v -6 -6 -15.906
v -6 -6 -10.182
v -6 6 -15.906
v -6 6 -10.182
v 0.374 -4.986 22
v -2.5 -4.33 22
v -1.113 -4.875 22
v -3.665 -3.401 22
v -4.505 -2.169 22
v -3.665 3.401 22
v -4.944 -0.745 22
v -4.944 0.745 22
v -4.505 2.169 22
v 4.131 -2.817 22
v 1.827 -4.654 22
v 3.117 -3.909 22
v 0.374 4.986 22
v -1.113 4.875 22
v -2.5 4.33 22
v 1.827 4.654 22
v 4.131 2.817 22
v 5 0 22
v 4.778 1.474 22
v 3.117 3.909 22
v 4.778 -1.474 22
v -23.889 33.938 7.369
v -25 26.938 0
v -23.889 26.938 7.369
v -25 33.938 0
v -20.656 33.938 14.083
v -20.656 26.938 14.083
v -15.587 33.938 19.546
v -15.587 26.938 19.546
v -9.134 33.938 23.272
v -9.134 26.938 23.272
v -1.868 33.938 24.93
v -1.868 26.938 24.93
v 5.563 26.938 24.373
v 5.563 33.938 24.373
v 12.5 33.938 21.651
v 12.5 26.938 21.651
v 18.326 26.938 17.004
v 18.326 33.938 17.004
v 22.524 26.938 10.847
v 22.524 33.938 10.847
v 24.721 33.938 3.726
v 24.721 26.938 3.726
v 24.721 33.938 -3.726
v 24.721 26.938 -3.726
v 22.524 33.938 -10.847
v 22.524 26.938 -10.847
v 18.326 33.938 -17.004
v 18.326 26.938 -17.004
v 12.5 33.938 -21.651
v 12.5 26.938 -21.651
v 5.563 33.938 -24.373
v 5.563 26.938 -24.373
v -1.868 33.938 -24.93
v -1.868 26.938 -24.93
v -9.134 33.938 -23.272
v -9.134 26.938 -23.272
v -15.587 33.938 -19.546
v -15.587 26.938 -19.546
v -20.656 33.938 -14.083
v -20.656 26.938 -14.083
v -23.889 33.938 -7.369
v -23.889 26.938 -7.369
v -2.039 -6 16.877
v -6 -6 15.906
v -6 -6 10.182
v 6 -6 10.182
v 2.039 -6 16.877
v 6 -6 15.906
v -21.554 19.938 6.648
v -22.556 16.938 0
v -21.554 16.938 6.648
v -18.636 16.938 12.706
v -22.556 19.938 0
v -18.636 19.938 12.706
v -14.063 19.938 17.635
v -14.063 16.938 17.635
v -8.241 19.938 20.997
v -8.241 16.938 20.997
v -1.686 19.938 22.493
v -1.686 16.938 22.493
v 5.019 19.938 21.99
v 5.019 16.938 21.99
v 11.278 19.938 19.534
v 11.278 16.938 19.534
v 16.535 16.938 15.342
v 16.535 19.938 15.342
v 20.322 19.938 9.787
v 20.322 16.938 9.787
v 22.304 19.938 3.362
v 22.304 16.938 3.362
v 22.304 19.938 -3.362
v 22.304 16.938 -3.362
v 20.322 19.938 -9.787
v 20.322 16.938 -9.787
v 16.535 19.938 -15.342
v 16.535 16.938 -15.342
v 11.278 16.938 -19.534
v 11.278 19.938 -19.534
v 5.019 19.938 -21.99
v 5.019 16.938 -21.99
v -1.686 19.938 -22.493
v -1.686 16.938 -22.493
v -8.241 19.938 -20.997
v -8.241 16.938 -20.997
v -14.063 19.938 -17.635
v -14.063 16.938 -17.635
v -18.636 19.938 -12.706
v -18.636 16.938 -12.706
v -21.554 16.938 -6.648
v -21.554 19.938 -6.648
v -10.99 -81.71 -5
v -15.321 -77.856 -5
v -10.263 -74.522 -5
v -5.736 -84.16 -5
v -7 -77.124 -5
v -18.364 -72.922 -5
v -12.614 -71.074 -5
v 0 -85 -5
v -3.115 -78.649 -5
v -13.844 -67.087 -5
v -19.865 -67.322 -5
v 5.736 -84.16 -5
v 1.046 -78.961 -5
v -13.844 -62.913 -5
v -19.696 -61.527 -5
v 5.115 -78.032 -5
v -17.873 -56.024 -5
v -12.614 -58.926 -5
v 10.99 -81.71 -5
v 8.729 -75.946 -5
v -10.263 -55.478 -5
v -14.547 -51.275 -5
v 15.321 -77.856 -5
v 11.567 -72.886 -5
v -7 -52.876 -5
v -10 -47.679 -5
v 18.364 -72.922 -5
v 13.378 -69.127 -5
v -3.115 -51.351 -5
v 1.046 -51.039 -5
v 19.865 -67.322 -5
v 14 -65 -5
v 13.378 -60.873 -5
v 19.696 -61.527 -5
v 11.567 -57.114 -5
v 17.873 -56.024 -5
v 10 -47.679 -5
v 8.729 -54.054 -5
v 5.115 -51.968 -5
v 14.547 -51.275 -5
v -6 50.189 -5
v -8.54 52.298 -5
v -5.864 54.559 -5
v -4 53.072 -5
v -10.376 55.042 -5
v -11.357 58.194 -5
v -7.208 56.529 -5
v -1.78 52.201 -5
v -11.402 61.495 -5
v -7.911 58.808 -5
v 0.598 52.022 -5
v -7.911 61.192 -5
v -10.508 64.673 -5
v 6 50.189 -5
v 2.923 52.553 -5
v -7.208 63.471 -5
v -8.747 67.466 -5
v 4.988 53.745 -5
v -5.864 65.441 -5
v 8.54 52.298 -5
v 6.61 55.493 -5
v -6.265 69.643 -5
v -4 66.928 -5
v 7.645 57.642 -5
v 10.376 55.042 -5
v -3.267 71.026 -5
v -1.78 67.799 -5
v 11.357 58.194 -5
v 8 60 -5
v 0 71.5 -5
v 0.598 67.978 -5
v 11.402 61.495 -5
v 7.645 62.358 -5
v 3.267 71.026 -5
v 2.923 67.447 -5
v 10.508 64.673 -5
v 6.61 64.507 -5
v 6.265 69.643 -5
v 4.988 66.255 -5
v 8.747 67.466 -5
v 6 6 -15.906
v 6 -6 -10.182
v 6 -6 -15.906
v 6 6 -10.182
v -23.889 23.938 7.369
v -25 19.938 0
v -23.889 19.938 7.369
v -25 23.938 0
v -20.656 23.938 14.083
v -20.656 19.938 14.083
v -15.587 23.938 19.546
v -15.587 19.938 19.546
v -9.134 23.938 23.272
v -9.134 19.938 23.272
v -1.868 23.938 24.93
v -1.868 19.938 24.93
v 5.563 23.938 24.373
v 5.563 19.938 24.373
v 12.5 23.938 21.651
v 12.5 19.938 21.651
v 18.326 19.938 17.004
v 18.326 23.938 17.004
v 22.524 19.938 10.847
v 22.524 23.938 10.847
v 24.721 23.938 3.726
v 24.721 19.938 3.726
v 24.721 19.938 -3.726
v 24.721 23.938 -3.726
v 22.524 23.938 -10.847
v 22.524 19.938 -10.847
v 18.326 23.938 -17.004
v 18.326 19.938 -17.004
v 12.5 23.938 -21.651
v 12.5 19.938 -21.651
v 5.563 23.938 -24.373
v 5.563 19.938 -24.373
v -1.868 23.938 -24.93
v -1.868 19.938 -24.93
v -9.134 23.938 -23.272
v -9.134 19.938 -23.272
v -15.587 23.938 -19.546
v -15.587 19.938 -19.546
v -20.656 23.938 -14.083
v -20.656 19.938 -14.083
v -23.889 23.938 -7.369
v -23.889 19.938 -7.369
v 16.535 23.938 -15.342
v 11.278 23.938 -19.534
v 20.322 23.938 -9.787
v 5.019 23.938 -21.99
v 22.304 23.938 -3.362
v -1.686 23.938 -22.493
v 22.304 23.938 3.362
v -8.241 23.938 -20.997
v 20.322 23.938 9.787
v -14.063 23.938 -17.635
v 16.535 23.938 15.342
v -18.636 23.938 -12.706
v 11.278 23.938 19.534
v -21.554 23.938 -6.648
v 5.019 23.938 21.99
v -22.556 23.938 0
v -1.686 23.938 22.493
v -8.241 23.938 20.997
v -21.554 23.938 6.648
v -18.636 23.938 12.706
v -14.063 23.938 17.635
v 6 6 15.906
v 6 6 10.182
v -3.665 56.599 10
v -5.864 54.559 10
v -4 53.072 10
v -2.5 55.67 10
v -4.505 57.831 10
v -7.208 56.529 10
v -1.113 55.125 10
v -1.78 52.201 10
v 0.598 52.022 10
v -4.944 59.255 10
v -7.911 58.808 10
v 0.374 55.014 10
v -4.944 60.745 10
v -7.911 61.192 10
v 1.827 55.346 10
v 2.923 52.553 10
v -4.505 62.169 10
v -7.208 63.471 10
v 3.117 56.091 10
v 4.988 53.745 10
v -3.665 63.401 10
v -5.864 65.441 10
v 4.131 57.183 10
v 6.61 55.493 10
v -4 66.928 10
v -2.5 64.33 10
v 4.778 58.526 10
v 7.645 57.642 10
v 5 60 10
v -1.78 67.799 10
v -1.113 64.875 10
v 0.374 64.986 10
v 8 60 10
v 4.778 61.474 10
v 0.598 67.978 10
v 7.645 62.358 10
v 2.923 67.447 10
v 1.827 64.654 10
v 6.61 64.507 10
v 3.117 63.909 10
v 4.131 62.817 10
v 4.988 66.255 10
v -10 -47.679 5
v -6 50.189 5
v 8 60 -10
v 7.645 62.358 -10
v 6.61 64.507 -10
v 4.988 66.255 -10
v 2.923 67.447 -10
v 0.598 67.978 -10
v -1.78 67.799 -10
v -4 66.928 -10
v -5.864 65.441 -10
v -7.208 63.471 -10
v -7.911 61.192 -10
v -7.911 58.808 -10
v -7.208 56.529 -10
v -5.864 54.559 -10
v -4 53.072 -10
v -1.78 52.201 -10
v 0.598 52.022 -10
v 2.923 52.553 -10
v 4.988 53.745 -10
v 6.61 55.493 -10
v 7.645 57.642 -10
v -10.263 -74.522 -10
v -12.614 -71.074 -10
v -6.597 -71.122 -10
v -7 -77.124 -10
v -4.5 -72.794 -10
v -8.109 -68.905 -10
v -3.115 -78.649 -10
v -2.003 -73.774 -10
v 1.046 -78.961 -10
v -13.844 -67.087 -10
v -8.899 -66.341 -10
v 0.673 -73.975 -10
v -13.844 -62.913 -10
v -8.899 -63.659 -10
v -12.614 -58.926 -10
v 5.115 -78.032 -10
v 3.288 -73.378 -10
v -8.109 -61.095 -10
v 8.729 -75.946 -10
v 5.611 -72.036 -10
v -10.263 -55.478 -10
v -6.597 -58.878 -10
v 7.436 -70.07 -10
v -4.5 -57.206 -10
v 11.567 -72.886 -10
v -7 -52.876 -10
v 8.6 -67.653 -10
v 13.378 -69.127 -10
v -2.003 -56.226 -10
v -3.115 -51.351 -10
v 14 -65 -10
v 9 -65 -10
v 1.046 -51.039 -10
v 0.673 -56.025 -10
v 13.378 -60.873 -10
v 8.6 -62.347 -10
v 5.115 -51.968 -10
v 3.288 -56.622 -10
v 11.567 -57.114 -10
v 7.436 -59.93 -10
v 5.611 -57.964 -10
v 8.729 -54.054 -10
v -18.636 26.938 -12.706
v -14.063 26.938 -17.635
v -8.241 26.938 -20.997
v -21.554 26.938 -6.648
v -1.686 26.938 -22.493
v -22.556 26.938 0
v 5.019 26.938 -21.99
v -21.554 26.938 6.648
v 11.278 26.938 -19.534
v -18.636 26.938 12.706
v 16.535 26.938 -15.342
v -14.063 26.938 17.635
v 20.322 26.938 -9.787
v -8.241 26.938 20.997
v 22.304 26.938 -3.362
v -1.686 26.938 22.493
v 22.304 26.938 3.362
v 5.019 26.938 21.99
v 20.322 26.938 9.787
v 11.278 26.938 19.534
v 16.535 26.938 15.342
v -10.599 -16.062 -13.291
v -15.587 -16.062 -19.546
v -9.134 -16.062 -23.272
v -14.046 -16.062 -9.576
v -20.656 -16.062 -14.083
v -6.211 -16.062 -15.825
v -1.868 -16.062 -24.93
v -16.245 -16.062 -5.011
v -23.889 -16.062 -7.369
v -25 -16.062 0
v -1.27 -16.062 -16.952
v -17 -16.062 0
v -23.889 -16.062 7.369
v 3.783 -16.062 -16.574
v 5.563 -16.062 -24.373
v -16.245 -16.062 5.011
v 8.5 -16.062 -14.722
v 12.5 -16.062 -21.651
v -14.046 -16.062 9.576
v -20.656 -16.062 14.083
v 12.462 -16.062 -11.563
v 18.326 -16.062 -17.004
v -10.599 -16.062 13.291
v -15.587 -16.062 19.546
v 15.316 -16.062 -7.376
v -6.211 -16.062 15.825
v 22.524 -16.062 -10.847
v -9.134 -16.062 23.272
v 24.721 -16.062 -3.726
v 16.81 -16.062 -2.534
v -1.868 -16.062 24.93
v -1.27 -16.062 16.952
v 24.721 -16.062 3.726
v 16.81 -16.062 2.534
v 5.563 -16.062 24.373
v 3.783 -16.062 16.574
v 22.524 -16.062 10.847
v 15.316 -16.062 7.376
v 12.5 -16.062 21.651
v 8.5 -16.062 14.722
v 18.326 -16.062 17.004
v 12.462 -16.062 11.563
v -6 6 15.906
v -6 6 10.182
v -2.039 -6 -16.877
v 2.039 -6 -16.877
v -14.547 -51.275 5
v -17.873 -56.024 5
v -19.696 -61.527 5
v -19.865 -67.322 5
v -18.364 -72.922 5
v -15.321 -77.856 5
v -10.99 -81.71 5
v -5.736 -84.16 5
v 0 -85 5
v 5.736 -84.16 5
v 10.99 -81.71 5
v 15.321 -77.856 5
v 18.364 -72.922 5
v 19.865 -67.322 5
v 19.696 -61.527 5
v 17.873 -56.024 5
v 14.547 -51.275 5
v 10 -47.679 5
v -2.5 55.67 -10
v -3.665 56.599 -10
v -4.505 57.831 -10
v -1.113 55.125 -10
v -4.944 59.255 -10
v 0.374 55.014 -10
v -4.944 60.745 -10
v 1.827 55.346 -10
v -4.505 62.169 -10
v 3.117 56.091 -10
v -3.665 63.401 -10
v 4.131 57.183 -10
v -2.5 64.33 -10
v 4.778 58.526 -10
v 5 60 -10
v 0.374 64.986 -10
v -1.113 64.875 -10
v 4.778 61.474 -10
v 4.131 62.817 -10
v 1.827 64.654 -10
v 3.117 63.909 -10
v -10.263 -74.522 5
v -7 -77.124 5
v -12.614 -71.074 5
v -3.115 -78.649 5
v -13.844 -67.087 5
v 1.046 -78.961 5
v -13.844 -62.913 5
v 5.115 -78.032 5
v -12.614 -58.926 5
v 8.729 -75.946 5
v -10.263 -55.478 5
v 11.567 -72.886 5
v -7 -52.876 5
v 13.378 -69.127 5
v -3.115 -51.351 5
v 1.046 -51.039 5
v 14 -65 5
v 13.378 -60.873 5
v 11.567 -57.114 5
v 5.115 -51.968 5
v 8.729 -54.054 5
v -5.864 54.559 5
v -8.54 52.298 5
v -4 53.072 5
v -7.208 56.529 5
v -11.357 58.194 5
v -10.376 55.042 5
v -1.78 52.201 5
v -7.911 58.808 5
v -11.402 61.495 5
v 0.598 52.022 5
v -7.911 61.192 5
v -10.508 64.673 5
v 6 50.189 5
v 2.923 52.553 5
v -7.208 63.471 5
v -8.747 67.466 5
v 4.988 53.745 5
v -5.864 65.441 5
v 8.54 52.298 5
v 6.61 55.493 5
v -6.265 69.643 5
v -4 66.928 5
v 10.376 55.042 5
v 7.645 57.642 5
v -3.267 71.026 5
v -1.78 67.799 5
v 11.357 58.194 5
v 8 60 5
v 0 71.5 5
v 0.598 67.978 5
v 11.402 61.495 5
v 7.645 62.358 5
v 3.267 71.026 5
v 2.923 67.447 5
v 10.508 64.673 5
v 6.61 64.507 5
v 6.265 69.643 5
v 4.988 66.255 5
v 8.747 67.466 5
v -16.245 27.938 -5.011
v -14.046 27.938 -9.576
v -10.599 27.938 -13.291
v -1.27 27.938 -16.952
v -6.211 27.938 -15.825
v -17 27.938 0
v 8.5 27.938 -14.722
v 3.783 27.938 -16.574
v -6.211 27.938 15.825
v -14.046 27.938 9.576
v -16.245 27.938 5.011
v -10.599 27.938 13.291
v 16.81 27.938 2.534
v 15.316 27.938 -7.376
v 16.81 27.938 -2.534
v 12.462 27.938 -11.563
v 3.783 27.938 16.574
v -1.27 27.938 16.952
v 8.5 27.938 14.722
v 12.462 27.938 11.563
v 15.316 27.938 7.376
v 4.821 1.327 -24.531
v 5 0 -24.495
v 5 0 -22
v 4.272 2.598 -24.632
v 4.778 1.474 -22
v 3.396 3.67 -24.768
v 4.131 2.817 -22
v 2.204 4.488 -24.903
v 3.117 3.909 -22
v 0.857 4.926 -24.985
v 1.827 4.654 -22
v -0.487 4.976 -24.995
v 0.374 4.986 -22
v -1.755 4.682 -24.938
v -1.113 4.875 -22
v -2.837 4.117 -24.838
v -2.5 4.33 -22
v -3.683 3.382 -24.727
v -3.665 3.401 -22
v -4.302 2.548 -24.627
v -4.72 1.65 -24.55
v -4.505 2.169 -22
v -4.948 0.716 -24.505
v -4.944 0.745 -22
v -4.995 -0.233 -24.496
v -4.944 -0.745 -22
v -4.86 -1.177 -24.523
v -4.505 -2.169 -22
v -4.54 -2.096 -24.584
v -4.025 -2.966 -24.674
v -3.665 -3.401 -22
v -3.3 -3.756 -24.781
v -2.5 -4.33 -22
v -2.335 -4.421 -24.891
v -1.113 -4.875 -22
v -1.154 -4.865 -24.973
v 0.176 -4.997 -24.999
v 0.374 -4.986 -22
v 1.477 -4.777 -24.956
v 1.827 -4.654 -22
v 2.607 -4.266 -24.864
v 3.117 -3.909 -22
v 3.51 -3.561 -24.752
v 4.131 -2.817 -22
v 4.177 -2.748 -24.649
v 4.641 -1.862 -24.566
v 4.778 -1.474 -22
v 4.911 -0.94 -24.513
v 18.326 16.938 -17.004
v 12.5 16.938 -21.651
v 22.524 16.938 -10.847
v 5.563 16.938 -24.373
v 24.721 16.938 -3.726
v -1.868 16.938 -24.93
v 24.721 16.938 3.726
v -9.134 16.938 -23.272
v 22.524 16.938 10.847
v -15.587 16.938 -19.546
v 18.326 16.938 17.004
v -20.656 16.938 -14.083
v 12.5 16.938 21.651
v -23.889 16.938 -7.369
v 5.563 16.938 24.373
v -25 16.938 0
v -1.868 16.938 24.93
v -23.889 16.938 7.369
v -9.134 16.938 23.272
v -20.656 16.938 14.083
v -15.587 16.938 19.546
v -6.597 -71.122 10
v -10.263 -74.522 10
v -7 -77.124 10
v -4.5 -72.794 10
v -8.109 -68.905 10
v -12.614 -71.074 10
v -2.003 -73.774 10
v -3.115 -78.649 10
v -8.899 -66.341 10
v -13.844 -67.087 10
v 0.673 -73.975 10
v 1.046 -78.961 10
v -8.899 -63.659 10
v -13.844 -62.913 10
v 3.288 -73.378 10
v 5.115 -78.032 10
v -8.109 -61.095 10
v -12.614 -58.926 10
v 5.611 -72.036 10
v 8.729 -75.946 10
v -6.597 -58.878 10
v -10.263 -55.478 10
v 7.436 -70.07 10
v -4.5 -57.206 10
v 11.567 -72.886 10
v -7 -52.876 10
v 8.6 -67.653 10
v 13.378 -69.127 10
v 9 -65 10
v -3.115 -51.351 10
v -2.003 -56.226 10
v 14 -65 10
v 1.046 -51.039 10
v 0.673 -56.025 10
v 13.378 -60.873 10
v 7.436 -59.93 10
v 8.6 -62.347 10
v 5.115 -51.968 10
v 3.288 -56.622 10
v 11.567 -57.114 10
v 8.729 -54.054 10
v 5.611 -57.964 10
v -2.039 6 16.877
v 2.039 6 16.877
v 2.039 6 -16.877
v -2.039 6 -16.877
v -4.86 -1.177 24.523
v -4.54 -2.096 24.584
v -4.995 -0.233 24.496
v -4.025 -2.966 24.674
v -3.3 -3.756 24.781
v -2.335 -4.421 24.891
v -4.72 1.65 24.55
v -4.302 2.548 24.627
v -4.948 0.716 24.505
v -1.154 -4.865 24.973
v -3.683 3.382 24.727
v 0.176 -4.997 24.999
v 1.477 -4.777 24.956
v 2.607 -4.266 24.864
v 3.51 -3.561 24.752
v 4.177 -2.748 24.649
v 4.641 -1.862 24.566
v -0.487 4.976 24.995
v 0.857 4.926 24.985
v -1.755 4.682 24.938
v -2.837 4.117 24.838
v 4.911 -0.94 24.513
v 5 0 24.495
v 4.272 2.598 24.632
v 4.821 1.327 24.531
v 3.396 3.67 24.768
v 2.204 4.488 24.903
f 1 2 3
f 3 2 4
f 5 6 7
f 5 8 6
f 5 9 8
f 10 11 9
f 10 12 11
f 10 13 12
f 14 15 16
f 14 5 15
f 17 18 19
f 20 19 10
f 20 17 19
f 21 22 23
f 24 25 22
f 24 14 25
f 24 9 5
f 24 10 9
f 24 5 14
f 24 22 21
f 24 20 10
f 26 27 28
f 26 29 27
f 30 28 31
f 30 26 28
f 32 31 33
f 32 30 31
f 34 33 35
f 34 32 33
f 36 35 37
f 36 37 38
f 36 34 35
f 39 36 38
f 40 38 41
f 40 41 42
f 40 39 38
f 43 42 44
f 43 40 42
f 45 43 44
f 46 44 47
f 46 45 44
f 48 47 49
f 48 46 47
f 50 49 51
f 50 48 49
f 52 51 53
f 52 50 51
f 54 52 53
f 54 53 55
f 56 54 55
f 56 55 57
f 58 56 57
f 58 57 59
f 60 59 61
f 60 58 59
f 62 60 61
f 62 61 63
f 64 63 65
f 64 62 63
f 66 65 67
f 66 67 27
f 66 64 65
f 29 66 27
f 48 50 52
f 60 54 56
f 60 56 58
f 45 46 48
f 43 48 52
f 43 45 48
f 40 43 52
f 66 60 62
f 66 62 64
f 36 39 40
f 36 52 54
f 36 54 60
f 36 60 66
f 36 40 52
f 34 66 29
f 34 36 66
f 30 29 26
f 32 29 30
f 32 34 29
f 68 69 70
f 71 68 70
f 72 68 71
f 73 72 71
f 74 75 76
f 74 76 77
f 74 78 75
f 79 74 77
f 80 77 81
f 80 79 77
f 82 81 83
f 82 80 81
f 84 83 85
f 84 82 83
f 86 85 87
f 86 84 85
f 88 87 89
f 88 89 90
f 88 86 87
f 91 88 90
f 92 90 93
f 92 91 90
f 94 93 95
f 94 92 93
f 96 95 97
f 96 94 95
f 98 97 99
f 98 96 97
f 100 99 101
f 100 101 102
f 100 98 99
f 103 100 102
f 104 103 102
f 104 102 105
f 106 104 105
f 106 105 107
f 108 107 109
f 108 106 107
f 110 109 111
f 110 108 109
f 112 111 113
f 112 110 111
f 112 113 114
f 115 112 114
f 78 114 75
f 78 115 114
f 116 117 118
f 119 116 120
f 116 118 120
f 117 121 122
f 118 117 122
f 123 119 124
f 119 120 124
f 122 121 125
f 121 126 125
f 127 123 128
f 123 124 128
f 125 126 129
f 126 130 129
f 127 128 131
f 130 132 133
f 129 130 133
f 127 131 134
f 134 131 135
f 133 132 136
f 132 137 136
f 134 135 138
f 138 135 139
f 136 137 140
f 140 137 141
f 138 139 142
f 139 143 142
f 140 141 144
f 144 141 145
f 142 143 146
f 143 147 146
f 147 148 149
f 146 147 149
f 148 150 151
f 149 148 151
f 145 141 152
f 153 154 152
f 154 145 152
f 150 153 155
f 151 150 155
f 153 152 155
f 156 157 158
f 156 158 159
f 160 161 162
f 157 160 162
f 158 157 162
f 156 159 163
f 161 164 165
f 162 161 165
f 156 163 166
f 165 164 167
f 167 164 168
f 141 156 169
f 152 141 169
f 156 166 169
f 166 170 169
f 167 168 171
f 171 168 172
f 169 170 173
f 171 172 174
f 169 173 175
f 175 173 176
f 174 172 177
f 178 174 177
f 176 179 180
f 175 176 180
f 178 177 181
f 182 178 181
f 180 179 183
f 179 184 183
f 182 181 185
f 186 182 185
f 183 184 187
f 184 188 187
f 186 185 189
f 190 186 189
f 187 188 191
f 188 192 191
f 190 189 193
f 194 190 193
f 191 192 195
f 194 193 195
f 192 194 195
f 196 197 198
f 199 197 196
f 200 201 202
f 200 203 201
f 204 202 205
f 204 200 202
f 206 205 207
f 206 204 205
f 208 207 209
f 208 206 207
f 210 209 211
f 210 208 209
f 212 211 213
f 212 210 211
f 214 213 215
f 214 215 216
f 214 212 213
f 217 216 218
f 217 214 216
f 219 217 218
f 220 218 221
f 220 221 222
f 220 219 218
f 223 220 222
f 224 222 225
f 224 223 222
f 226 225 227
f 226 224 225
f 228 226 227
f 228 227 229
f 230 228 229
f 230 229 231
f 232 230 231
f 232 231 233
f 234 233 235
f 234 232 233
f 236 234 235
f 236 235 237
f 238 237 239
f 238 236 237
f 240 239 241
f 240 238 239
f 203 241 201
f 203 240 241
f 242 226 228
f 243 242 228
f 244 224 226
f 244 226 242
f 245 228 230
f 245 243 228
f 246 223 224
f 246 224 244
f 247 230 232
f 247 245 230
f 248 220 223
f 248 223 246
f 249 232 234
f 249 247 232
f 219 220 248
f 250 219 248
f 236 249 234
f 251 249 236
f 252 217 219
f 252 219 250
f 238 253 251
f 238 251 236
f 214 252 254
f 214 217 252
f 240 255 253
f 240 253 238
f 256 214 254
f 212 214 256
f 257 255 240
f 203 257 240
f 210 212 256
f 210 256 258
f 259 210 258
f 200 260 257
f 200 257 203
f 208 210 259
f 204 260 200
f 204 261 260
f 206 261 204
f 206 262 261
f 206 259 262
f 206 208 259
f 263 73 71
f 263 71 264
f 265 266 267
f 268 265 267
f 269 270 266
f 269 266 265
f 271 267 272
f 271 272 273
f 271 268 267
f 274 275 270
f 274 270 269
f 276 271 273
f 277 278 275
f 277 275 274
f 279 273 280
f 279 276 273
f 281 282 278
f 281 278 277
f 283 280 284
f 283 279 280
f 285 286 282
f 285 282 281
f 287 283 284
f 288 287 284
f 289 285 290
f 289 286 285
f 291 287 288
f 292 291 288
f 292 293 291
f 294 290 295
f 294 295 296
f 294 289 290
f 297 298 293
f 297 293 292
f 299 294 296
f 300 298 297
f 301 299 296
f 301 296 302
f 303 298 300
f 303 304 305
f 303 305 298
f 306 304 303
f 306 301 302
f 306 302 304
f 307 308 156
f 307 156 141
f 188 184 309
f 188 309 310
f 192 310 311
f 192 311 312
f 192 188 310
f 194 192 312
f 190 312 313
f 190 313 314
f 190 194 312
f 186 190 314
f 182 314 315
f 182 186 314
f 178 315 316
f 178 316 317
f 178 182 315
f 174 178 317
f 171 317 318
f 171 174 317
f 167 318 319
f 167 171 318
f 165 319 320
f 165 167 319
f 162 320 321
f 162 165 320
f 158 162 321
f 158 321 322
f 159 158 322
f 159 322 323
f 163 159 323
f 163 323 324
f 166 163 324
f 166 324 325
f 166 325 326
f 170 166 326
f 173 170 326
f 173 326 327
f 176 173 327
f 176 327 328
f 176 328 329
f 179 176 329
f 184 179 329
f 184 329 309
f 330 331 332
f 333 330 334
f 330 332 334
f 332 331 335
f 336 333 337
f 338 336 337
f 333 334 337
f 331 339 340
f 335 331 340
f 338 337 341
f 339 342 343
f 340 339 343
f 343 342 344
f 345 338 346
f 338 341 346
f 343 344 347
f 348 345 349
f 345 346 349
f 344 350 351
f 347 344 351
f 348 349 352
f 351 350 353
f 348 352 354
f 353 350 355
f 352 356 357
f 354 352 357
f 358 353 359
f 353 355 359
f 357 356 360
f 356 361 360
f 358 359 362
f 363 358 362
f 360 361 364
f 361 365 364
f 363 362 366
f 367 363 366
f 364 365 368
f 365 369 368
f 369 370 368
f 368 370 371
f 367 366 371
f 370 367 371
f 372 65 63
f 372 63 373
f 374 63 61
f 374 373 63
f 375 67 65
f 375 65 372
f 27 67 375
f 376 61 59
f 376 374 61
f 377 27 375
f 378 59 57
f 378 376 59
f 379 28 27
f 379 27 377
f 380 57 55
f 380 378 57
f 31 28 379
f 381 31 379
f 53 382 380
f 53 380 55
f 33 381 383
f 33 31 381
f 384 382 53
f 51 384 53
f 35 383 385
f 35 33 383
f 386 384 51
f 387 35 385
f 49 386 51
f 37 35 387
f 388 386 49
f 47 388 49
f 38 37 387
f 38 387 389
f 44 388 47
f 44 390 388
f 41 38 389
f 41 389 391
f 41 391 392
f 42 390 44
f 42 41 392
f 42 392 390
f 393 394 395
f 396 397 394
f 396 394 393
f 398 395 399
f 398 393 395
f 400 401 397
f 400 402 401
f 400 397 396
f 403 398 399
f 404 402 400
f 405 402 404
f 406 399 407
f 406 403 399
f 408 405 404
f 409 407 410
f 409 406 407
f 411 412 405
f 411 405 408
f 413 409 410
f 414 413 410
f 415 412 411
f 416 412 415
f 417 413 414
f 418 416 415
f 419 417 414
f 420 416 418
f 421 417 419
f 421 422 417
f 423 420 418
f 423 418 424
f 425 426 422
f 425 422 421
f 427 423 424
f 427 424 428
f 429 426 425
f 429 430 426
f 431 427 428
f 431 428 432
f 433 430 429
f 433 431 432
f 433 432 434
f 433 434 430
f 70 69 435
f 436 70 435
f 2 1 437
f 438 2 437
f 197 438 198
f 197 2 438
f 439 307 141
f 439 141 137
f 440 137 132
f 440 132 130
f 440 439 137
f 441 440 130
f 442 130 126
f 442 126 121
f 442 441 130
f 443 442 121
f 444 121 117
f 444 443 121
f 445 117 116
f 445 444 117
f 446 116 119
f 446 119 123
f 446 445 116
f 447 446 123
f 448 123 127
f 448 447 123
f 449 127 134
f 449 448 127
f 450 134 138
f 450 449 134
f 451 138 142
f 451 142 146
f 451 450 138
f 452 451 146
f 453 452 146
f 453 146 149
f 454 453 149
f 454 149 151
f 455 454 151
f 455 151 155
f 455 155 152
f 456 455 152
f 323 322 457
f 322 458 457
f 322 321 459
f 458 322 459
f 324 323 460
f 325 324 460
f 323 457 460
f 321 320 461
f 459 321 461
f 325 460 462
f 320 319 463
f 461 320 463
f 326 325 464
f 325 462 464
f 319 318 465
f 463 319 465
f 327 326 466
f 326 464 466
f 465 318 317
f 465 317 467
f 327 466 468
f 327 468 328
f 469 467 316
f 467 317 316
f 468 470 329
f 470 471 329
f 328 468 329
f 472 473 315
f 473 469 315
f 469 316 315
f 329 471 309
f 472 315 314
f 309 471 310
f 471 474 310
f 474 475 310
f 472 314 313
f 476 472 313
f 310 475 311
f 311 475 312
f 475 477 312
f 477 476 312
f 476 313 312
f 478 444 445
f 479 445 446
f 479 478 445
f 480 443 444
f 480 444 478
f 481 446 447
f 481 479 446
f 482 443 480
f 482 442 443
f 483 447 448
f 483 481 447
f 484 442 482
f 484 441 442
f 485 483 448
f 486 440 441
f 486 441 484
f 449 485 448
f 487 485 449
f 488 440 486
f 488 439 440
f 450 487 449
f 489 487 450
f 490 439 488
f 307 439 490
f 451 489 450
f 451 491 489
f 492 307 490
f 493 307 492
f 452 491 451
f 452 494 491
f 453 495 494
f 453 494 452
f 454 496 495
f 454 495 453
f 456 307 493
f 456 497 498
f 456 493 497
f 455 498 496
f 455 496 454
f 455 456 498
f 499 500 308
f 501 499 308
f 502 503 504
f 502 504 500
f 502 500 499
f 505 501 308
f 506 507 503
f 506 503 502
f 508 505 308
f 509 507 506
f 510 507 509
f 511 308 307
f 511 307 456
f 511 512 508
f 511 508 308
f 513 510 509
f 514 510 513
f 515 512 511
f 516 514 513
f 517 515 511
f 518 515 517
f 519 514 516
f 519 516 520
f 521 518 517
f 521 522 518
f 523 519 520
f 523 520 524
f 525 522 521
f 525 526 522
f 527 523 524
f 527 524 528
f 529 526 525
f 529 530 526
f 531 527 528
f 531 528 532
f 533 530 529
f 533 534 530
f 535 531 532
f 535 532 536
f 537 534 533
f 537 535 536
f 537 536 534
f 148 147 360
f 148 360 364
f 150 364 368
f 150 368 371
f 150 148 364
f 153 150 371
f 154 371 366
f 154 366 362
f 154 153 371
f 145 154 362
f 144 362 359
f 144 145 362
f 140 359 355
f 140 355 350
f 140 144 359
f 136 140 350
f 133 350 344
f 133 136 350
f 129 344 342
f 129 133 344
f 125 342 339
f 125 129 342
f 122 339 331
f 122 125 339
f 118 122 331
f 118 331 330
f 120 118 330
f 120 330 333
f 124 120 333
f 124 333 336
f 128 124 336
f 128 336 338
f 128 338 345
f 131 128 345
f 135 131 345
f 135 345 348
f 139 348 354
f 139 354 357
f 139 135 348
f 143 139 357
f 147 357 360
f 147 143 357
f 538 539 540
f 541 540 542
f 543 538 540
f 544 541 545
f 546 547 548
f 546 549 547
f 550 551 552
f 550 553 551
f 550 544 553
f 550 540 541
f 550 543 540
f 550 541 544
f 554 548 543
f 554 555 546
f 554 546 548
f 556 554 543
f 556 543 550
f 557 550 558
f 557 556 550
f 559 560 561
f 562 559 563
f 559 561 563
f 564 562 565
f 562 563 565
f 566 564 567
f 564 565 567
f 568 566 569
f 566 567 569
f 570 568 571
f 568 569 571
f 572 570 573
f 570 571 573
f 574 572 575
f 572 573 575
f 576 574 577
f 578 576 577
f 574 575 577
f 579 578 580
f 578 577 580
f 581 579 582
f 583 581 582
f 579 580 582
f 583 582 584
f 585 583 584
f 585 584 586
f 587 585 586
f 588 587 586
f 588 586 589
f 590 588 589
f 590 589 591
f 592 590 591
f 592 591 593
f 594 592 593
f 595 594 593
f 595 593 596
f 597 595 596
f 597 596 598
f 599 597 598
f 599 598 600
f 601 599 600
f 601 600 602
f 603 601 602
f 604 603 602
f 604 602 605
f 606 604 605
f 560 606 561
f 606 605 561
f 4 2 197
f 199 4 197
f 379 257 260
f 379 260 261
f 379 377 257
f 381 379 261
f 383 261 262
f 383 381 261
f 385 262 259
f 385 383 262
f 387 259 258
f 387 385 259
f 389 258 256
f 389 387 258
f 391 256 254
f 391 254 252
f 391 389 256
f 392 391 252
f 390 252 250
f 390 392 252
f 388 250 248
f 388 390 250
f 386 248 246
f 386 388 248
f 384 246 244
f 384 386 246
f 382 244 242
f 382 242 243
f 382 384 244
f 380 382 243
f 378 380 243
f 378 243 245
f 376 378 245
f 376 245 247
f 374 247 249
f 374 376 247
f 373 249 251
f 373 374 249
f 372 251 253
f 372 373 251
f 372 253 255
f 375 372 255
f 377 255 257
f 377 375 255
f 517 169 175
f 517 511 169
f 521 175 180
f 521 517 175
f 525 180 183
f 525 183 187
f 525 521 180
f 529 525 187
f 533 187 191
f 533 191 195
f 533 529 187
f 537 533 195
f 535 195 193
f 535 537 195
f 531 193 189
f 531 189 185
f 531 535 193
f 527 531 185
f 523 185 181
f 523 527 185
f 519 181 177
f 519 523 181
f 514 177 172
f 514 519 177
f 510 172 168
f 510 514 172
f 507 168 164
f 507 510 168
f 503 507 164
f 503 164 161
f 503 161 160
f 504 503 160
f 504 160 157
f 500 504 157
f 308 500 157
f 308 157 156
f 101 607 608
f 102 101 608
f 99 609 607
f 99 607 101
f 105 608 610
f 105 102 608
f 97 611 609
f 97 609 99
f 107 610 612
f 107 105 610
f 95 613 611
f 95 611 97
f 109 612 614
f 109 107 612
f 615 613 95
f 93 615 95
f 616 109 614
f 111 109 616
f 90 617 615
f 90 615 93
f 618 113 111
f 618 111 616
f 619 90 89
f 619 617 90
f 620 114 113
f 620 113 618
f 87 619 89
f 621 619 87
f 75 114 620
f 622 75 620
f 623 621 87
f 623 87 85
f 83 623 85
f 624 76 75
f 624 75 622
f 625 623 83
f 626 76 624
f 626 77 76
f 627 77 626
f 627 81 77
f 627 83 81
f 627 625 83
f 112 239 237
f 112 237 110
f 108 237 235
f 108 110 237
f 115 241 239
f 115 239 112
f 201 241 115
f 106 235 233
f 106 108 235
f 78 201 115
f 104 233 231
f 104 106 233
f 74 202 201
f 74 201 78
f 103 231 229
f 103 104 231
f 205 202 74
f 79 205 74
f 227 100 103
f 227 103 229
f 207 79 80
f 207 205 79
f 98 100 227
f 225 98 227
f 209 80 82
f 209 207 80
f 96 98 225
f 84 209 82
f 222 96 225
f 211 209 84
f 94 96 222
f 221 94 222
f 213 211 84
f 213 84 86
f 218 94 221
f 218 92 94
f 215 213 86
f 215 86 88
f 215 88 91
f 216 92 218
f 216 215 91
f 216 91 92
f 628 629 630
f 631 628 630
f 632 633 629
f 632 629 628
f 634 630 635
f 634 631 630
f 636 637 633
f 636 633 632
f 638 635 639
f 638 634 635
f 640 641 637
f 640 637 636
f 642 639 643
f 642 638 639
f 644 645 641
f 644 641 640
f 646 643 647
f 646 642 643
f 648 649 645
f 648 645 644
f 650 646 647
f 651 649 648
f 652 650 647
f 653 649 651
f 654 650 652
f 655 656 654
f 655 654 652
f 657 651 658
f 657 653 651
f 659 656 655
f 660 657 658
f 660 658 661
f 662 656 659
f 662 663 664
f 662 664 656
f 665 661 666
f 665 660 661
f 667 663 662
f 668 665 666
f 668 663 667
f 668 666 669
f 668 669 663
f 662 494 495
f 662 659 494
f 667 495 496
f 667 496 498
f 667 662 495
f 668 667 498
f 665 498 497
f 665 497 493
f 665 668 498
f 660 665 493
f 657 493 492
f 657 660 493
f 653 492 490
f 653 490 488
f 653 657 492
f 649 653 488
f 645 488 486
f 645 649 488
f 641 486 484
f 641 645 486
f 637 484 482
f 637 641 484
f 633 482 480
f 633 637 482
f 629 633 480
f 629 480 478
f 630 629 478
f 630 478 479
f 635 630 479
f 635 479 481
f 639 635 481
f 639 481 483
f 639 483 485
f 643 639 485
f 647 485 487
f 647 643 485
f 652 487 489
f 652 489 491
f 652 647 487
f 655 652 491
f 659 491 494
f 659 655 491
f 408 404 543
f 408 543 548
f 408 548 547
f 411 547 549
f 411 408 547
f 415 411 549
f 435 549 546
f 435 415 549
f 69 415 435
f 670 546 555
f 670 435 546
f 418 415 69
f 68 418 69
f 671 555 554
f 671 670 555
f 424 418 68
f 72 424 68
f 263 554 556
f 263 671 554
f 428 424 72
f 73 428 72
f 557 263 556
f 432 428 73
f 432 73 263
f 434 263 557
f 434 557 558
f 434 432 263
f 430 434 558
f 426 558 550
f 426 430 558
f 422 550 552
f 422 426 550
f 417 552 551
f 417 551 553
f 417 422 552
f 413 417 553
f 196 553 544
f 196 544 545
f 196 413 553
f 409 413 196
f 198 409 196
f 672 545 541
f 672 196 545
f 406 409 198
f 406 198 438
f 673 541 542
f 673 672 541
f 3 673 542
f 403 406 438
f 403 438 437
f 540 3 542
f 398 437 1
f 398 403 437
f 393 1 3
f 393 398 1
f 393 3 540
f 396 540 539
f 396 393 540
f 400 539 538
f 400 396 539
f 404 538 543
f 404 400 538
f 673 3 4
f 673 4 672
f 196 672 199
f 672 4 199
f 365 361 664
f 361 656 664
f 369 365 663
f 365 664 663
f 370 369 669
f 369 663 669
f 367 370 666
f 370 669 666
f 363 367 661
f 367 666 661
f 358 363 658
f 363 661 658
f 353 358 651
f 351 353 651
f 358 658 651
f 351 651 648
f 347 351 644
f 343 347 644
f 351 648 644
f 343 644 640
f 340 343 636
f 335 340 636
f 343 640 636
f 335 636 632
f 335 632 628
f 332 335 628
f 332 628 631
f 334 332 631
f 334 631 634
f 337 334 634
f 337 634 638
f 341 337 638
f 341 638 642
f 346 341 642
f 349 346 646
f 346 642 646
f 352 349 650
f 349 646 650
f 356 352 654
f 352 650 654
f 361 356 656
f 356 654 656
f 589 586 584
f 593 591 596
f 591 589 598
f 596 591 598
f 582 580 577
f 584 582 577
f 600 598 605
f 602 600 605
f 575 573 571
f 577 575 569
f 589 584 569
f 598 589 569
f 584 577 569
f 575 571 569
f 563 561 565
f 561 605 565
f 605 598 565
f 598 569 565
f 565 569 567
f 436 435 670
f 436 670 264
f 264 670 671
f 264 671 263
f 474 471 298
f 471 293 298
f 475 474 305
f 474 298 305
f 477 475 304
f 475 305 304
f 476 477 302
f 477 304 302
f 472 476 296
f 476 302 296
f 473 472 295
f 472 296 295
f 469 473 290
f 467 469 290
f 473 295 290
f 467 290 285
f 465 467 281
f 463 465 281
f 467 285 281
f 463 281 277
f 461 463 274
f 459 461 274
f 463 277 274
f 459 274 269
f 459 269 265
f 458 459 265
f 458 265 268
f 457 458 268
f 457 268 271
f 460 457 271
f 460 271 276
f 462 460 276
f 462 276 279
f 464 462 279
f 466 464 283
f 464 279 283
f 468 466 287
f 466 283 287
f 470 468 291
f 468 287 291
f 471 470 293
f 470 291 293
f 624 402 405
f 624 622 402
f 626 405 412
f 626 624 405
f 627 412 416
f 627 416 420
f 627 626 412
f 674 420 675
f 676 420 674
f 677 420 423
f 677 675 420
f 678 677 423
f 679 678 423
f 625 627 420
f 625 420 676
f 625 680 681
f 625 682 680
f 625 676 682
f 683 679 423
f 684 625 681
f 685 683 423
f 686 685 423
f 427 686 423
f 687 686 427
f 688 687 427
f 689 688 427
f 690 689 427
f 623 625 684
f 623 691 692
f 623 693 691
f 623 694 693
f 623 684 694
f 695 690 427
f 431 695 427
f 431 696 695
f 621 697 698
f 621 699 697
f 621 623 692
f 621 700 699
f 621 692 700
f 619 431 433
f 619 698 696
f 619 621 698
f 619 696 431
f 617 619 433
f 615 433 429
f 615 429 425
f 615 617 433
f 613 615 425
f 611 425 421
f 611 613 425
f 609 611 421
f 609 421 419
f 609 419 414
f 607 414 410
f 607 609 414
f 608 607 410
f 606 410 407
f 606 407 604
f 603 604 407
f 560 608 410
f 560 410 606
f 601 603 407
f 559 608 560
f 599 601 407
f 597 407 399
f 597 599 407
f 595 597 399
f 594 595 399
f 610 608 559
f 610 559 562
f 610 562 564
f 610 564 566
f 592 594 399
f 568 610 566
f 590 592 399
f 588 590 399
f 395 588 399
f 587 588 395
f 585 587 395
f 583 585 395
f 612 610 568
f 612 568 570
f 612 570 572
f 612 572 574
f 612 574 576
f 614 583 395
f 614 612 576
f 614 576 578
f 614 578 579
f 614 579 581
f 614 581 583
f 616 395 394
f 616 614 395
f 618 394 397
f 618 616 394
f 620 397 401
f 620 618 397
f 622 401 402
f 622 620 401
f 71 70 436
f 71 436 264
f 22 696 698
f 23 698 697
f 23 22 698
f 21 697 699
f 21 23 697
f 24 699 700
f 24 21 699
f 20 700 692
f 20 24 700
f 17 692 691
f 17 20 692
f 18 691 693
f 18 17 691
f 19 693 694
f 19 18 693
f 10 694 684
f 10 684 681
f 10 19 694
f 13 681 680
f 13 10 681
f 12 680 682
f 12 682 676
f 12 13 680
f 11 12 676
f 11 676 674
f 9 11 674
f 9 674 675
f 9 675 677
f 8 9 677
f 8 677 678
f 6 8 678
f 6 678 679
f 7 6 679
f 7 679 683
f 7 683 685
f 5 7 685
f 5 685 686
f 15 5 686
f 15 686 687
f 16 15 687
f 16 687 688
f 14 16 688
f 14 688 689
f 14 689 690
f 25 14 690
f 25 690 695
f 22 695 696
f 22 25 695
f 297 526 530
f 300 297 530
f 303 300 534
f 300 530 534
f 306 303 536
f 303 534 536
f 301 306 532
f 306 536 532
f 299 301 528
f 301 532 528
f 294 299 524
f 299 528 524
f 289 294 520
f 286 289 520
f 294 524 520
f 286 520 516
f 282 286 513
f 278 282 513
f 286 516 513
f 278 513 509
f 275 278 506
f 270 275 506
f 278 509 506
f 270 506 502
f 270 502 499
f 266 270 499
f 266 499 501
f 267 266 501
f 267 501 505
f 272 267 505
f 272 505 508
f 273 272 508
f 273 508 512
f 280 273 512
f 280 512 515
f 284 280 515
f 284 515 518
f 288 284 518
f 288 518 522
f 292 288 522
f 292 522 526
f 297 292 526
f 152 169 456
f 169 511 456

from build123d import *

# Parameters (mm, degrees)
SKETCH001_R          = 5
POCKET_DEPTH         = 25.001
POCKET_DEPTH_BACK    = 25.001
SKETCH005_W          = 12
SKETCH005_H          = 12
PAD002_DEPTH         = 44
SKETCH006_W          = 20.492604
SKETCH006_H          = 20.363478
POCKET002_DEPTH      = 16
PAD_DEPTH            = 5
SKETCH003_R          = 8
SKETCH003_R_2        = 14
PAD001_DEPTH         = 10
SKETCH004_R          = 5
SKETCH004_R_2        = 9
POCKET001_DEPTH      = 10.001
POCKET001_DEPTH_BACK = -10.001


with BuildPart() as head:
    # Sketch → Revolution (revolve)
    with BuildSketch(Plane.XY):
        Polygon((-17, -16.062352), (-25, -16.062352), (-25, 16.937648), (-22.55582, 16.937648), (-22.55582, 19.937648), (-25, 19.937648), (-25, 23.937648), (-22.55582, 23.937648), (-22.55582, 26.937648), (-25, 26.937648), (-25, 33.937648), (0, 33.937648), (0, 27.937648), (-17, 27.937648), align=None)
    revolve(axis=Axis((0, 0, 0), (0, 1, 0)))

    # Sketch001 → Pocket (cut, two sides)
    with BuildSketch(Plane.XY) as pocket_sk:
        Circle(SKETCH001_R)
    extrude(amount=POCKET_DEPTH, mode=Mode.SUBTRACT)
    extrude(pocket_sk.sketch, amount=-POCKET_DEPTH_BACK, mode=Mode.SUBTRACT)

    # Sketch005 → Pad002 (join)
    with BuildSketch(Plane.XY.offset(22)):
        Rectangle(SKETCH005_W, SKETCH005_H)
    extrude(amount=-PAD002_DEPTH)

    # Sketch006 → Pocket002 (cut)
    with BuildSketch(Plane.XZ.offset(10)):
        Rectangle(SKETCH006_W, SKETCH006_H)
    extrude(amount=-POCKET002_DEPTH, mode=Mode.SUBTRACT)


with BuildPart() as rod:
    # Sketch002 → Pad (new body, symmetric)
    with BuildSketch(Plane.XY):
        with BuildLine():
            ThreePointArc((6, 50.189292), (0, 71.5), (-6, 50.189292))
            Line((-6, 50.189292), (-10, -47.679492))
            ThreePointArc((-10, -47.679492), (0, -85), (10, -47.679492))
            Line((6, 50.189292), (10, -47.679492))
        make_face()
    extrude(amount=PAD_DEPTH, both=True)

    # Sketch003 → Pad001 (join, symmetric)
    with BuildSketch(Plane.XY):
        with Locations((0, 60)):
            Circle(SKETCH003_R)
        with Locations((0, -65)):
            Circle(SKETCH003_R_2)
    extrude(amount=PAD001_DEPTH, both=True)

    # Sketch004 → Pocket001 (cut, two sides)
    with BuildSketch(Plane.XY) as pocket001_sk:
        with Locations((0, 60)):
            Circle(SKETCH004_R)
        with Locations((0, -65)):
            Circle(SKETCH004_R_2)
    extrude(amount=-POCKET001_DEPTH, mode=Mode.SUBTRACT)
    extrude(pocket001_sk.sketch, amount=-POCKET001_DEPTH_BACK, mode=Mode.SUBTRACT)


solid = Compound([head.part, rod.part])
